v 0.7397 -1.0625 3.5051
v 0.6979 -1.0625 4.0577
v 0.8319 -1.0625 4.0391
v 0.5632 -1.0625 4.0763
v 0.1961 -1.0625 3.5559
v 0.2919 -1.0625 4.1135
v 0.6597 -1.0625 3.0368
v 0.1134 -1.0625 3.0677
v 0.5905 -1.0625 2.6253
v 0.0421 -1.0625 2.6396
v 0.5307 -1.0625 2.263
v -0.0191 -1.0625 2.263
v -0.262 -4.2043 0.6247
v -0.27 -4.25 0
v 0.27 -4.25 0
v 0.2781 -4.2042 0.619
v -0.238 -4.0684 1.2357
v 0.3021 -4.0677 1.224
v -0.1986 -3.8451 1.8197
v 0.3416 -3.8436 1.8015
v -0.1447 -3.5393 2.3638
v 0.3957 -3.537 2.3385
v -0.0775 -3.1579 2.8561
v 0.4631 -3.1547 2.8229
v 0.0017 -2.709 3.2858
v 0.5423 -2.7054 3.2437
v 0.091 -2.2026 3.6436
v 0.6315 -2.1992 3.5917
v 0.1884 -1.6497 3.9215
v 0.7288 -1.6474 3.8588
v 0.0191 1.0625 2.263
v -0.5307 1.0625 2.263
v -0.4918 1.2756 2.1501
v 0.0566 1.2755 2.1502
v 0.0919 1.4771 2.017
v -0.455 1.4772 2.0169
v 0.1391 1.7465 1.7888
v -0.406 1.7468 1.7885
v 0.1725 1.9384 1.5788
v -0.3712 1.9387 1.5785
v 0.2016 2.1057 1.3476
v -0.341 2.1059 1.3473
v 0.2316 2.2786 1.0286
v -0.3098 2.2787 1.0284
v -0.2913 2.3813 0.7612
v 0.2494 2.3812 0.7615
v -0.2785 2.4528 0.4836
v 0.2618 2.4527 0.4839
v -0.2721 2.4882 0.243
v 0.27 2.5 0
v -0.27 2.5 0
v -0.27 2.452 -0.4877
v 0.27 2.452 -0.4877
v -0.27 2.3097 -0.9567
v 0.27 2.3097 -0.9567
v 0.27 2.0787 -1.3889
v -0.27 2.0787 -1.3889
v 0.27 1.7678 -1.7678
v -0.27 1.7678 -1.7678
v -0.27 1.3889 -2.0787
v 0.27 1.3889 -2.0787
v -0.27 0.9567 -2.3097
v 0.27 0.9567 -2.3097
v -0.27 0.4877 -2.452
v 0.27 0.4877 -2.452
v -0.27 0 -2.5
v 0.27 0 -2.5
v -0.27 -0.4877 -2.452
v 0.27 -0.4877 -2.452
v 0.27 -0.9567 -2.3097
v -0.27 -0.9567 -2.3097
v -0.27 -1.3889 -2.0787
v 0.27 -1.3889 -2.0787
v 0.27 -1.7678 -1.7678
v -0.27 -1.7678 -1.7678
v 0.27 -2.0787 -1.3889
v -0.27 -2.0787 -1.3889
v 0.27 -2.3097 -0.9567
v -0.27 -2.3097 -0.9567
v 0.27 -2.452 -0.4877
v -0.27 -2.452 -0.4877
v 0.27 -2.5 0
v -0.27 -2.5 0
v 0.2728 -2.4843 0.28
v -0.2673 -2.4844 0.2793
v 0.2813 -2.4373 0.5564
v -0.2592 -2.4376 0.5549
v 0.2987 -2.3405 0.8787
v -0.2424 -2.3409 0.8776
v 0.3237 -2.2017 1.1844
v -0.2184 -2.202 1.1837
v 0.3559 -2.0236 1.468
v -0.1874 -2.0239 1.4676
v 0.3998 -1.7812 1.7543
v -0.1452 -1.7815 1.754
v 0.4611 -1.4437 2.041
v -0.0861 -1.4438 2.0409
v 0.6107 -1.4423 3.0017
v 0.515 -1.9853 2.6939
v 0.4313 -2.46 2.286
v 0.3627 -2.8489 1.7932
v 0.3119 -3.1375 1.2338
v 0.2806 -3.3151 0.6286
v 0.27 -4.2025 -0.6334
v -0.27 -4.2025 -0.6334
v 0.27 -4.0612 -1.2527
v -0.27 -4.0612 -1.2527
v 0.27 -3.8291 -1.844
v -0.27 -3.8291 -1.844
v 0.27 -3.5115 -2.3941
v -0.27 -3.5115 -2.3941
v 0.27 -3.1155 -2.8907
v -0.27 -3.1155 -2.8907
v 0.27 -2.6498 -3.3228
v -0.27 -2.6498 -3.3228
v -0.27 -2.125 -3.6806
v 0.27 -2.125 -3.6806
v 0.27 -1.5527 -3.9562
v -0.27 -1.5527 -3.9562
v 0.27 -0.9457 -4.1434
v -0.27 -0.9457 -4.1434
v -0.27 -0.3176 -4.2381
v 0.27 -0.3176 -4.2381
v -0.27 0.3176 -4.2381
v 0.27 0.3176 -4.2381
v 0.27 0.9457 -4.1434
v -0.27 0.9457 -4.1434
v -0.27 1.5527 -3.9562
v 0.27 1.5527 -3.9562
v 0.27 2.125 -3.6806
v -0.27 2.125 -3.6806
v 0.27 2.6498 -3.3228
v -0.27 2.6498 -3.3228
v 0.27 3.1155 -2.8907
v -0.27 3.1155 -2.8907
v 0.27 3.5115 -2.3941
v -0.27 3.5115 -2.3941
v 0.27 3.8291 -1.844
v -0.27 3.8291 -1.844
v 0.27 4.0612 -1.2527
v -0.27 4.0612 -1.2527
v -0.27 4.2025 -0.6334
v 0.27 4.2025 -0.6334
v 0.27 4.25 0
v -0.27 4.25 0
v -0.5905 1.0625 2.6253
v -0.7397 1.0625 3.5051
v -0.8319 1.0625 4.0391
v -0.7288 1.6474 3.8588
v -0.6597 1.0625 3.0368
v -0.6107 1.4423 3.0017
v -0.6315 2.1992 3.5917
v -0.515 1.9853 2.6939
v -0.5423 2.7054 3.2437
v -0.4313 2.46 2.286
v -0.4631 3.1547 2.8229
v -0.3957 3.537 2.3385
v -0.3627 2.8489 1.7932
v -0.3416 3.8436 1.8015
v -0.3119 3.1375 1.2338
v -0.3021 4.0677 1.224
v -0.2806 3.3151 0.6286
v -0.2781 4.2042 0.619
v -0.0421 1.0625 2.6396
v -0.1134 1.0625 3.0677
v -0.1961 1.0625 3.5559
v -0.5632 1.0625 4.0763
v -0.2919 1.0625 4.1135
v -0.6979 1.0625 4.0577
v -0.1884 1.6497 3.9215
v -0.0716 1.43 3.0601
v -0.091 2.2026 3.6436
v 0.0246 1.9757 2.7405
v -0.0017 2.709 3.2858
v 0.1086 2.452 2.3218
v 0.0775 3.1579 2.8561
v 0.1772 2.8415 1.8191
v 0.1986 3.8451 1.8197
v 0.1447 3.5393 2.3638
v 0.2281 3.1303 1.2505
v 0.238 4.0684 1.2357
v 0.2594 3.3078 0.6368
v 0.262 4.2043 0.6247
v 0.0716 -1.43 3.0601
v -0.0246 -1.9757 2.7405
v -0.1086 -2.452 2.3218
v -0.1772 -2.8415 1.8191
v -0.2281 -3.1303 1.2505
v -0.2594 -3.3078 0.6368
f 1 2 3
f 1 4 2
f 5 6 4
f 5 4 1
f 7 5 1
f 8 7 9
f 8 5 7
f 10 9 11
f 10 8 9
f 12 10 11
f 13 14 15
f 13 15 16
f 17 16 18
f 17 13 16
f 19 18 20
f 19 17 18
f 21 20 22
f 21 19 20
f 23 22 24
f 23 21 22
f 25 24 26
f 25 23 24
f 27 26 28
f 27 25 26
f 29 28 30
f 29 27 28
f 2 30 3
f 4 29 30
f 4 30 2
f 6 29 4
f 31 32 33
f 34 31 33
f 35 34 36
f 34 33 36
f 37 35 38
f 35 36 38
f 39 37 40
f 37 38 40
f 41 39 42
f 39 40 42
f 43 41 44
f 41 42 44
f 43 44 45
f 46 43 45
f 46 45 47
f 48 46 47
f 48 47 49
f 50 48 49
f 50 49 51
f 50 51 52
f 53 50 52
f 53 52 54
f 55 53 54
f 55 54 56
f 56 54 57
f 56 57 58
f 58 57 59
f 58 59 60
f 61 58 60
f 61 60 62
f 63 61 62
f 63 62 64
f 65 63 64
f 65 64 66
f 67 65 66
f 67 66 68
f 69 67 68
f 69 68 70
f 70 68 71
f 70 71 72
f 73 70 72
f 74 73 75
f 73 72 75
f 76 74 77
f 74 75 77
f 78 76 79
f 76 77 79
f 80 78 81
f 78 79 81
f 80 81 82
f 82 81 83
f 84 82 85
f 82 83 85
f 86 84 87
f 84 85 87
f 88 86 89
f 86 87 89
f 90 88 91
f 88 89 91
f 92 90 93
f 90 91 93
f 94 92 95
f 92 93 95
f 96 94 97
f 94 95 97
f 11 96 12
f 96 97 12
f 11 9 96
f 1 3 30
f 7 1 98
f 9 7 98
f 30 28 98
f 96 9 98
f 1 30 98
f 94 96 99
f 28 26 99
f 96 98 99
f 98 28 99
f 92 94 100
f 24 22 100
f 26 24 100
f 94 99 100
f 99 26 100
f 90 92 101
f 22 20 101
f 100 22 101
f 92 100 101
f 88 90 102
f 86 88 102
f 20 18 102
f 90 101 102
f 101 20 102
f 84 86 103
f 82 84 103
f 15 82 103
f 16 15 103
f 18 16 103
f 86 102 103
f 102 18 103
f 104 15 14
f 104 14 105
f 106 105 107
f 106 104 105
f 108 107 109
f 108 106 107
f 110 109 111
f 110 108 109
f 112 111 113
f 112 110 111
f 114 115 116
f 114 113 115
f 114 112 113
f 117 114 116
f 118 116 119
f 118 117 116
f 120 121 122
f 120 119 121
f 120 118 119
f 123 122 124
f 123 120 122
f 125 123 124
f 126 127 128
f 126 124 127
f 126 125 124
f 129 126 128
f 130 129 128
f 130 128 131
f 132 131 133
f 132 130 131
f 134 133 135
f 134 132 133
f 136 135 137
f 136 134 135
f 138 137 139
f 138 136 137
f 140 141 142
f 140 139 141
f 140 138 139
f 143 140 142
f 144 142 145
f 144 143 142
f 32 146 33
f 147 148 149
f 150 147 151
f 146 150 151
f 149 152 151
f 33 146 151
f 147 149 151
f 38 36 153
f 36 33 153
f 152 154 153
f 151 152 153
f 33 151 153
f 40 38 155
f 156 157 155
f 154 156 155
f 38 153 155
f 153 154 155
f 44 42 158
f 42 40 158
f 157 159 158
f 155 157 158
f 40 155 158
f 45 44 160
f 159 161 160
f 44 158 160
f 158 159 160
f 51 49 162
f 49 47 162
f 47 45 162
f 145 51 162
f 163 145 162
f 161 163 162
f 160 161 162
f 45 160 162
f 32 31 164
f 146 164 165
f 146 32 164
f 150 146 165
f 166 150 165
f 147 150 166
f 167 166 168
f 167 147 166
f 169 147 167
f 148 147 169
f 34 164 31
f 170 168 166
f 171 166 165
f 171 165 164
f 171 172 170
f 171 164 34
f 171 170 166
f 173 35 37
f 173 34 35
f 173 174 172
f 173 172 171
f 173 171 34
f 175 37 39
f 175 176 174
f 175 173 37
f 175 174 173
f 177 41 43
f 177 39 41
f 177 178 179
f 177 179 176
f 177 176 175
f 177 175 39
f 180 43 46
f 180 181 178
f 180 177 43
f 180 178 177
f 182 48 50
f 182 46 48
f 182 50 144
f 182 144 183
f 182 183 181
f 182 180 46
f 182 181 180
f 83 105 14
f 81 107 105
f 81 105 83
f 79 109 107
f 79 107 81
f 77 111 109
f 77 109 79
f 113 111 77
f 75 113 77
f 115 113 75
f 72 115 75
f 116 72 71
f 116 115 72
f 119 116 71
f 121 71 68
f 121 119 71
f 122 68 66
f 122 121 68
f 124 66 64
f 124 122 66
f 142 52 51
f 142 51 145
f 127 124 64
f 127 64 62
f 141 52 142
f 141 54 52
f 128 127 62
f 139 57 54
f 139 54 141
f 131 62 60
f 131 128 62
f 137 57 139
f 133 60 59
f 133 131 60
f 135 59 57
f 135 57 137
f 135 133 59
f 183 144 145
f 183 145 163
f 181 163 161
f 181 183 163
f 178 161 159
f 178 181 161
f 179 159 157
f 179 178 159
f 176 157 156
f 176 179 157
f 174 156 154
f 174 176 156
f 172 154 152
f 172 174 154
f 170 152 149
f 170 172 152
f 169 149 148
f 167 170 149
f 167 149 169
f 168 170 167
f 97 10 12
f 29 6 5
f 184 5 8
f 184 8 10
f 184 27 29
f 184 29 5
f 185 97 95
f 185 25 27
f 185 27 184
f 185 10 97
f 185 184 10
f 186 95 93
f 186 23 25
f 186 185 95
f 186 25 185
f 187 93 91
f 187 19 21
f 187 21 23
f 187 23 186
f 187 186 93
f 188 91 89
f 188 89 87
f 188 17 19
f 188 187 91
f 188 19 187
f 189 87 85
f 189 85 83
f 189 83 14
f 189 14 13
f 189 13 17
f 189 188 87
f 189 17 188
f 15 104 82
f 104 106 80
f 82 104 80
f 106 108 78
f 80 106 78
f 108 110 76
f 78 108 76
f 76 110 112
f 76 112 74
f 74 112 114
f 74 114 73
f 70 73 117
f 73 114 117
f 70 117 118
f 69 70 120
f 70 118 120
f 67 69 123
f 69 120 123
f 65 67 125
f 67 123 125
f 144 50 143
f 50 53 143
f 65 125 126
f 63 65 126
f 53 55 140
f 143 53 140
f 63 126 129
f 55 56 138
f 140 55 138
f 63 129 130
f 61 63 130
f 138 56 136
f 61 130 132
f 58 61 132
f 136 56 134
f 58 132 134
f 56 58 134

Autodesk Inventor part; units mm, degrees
sketch "Sketch_1" plane through (0, 0, 0) normal (0, 0, 1) x (1, 0, 0)
  line L0 (0.27, 0) -> (-0.27, 0)
  line L1 (-0.27, 0) -> (-0.27, 4.25)
  line L2 (-0.27, 4.25) -> (0.27, 4.25)
  line L3 (0.27, 4.25) -> (0.27, 0)
  line L4 (0.27, 0) -> (-0.27, 0)
revolve "Revolution1" add sketch "Sketch_1" angle 180 about axis through (0.27, 0, 0) along (-1, 0, 0)
sketch "Sketch_2" plane through (0, 0, 0) normal (0, 0, 1) x (1, 0, 0)
  line L0 (0.27, -0.0476) -> (-0.27, 0.0476)
  line L1 (-0.27, 0.0476) -> (-0.27, 4.25)
  line L2 (-0.27, 4.25) -> (0.27, 4.25)
  line L3 (0.27, 4.25) -> (0.27, -0.0476)
  line L4 (0.27, -0.0476) -> (-0.27, 0.0476)
revolve "Revolution2" add sketch "Sketch_2" angle 90 about axis through (0.27, -0.0476, 0) along (0.9848078, -0.1736482, 0)
sketch "Sketch_3" plane through (0, 0, 0) normal (0, 0, 1) x (1, 0, 0)
  line L0 (-0.27, 0.0476) -> (0.27, -0.0476)
  line L1 (0.27, -0.0476) -> (0.27, -4.25)
  line L2 (0.27, -4.25) -> (-0.27, -4.25)
  line L3 (-0.27, -4.25) -> (-0.27, 0.0476)
  line L4 (-0.27, 0.0476) -> (0.27, -0.0476)
revolve "Revolution3" add sketch "Sketch_3" angle 90 about axis through (-0.27, 0.0476, 0) along (-0.9848078, 0.1736482, 0)
sketch "Sketch_4" plane through (0, 0, 0) normal (1, 0, 0) x (0, 1, 0)
  line L0 (-1.0625, 4.25) -> (-1.0625, 2.263)
  arc A0 (-1.0625, 2.263) -> (1.0625, 2.263) centre (0, 0) ccw
  line L1 (1.0625, 2.263) -> (1.0625, 4.25)
  line L2 (1.0625, 4.25) -> (-1.0625, 4.25)
extrude "Extrusion1" cut sketch "Sketch_4" along normal mid plane 17
ref_plane "spring_washer_to_bolt_XY" through (0, 0, 0) normal (1, 0, 0) x (0, 0, -1)
ref_plane "spring_washer_to_bolt_YZ" through (0, 0, 0) normal (0, 0, -1) x (0, 1, 0)
ref_plane "spring_washer_to_bolt_ZX" through (0, 0, 0) normal (0, 1, 0) x (1, 0, 0)
properties part number "Washer-Spring5"
